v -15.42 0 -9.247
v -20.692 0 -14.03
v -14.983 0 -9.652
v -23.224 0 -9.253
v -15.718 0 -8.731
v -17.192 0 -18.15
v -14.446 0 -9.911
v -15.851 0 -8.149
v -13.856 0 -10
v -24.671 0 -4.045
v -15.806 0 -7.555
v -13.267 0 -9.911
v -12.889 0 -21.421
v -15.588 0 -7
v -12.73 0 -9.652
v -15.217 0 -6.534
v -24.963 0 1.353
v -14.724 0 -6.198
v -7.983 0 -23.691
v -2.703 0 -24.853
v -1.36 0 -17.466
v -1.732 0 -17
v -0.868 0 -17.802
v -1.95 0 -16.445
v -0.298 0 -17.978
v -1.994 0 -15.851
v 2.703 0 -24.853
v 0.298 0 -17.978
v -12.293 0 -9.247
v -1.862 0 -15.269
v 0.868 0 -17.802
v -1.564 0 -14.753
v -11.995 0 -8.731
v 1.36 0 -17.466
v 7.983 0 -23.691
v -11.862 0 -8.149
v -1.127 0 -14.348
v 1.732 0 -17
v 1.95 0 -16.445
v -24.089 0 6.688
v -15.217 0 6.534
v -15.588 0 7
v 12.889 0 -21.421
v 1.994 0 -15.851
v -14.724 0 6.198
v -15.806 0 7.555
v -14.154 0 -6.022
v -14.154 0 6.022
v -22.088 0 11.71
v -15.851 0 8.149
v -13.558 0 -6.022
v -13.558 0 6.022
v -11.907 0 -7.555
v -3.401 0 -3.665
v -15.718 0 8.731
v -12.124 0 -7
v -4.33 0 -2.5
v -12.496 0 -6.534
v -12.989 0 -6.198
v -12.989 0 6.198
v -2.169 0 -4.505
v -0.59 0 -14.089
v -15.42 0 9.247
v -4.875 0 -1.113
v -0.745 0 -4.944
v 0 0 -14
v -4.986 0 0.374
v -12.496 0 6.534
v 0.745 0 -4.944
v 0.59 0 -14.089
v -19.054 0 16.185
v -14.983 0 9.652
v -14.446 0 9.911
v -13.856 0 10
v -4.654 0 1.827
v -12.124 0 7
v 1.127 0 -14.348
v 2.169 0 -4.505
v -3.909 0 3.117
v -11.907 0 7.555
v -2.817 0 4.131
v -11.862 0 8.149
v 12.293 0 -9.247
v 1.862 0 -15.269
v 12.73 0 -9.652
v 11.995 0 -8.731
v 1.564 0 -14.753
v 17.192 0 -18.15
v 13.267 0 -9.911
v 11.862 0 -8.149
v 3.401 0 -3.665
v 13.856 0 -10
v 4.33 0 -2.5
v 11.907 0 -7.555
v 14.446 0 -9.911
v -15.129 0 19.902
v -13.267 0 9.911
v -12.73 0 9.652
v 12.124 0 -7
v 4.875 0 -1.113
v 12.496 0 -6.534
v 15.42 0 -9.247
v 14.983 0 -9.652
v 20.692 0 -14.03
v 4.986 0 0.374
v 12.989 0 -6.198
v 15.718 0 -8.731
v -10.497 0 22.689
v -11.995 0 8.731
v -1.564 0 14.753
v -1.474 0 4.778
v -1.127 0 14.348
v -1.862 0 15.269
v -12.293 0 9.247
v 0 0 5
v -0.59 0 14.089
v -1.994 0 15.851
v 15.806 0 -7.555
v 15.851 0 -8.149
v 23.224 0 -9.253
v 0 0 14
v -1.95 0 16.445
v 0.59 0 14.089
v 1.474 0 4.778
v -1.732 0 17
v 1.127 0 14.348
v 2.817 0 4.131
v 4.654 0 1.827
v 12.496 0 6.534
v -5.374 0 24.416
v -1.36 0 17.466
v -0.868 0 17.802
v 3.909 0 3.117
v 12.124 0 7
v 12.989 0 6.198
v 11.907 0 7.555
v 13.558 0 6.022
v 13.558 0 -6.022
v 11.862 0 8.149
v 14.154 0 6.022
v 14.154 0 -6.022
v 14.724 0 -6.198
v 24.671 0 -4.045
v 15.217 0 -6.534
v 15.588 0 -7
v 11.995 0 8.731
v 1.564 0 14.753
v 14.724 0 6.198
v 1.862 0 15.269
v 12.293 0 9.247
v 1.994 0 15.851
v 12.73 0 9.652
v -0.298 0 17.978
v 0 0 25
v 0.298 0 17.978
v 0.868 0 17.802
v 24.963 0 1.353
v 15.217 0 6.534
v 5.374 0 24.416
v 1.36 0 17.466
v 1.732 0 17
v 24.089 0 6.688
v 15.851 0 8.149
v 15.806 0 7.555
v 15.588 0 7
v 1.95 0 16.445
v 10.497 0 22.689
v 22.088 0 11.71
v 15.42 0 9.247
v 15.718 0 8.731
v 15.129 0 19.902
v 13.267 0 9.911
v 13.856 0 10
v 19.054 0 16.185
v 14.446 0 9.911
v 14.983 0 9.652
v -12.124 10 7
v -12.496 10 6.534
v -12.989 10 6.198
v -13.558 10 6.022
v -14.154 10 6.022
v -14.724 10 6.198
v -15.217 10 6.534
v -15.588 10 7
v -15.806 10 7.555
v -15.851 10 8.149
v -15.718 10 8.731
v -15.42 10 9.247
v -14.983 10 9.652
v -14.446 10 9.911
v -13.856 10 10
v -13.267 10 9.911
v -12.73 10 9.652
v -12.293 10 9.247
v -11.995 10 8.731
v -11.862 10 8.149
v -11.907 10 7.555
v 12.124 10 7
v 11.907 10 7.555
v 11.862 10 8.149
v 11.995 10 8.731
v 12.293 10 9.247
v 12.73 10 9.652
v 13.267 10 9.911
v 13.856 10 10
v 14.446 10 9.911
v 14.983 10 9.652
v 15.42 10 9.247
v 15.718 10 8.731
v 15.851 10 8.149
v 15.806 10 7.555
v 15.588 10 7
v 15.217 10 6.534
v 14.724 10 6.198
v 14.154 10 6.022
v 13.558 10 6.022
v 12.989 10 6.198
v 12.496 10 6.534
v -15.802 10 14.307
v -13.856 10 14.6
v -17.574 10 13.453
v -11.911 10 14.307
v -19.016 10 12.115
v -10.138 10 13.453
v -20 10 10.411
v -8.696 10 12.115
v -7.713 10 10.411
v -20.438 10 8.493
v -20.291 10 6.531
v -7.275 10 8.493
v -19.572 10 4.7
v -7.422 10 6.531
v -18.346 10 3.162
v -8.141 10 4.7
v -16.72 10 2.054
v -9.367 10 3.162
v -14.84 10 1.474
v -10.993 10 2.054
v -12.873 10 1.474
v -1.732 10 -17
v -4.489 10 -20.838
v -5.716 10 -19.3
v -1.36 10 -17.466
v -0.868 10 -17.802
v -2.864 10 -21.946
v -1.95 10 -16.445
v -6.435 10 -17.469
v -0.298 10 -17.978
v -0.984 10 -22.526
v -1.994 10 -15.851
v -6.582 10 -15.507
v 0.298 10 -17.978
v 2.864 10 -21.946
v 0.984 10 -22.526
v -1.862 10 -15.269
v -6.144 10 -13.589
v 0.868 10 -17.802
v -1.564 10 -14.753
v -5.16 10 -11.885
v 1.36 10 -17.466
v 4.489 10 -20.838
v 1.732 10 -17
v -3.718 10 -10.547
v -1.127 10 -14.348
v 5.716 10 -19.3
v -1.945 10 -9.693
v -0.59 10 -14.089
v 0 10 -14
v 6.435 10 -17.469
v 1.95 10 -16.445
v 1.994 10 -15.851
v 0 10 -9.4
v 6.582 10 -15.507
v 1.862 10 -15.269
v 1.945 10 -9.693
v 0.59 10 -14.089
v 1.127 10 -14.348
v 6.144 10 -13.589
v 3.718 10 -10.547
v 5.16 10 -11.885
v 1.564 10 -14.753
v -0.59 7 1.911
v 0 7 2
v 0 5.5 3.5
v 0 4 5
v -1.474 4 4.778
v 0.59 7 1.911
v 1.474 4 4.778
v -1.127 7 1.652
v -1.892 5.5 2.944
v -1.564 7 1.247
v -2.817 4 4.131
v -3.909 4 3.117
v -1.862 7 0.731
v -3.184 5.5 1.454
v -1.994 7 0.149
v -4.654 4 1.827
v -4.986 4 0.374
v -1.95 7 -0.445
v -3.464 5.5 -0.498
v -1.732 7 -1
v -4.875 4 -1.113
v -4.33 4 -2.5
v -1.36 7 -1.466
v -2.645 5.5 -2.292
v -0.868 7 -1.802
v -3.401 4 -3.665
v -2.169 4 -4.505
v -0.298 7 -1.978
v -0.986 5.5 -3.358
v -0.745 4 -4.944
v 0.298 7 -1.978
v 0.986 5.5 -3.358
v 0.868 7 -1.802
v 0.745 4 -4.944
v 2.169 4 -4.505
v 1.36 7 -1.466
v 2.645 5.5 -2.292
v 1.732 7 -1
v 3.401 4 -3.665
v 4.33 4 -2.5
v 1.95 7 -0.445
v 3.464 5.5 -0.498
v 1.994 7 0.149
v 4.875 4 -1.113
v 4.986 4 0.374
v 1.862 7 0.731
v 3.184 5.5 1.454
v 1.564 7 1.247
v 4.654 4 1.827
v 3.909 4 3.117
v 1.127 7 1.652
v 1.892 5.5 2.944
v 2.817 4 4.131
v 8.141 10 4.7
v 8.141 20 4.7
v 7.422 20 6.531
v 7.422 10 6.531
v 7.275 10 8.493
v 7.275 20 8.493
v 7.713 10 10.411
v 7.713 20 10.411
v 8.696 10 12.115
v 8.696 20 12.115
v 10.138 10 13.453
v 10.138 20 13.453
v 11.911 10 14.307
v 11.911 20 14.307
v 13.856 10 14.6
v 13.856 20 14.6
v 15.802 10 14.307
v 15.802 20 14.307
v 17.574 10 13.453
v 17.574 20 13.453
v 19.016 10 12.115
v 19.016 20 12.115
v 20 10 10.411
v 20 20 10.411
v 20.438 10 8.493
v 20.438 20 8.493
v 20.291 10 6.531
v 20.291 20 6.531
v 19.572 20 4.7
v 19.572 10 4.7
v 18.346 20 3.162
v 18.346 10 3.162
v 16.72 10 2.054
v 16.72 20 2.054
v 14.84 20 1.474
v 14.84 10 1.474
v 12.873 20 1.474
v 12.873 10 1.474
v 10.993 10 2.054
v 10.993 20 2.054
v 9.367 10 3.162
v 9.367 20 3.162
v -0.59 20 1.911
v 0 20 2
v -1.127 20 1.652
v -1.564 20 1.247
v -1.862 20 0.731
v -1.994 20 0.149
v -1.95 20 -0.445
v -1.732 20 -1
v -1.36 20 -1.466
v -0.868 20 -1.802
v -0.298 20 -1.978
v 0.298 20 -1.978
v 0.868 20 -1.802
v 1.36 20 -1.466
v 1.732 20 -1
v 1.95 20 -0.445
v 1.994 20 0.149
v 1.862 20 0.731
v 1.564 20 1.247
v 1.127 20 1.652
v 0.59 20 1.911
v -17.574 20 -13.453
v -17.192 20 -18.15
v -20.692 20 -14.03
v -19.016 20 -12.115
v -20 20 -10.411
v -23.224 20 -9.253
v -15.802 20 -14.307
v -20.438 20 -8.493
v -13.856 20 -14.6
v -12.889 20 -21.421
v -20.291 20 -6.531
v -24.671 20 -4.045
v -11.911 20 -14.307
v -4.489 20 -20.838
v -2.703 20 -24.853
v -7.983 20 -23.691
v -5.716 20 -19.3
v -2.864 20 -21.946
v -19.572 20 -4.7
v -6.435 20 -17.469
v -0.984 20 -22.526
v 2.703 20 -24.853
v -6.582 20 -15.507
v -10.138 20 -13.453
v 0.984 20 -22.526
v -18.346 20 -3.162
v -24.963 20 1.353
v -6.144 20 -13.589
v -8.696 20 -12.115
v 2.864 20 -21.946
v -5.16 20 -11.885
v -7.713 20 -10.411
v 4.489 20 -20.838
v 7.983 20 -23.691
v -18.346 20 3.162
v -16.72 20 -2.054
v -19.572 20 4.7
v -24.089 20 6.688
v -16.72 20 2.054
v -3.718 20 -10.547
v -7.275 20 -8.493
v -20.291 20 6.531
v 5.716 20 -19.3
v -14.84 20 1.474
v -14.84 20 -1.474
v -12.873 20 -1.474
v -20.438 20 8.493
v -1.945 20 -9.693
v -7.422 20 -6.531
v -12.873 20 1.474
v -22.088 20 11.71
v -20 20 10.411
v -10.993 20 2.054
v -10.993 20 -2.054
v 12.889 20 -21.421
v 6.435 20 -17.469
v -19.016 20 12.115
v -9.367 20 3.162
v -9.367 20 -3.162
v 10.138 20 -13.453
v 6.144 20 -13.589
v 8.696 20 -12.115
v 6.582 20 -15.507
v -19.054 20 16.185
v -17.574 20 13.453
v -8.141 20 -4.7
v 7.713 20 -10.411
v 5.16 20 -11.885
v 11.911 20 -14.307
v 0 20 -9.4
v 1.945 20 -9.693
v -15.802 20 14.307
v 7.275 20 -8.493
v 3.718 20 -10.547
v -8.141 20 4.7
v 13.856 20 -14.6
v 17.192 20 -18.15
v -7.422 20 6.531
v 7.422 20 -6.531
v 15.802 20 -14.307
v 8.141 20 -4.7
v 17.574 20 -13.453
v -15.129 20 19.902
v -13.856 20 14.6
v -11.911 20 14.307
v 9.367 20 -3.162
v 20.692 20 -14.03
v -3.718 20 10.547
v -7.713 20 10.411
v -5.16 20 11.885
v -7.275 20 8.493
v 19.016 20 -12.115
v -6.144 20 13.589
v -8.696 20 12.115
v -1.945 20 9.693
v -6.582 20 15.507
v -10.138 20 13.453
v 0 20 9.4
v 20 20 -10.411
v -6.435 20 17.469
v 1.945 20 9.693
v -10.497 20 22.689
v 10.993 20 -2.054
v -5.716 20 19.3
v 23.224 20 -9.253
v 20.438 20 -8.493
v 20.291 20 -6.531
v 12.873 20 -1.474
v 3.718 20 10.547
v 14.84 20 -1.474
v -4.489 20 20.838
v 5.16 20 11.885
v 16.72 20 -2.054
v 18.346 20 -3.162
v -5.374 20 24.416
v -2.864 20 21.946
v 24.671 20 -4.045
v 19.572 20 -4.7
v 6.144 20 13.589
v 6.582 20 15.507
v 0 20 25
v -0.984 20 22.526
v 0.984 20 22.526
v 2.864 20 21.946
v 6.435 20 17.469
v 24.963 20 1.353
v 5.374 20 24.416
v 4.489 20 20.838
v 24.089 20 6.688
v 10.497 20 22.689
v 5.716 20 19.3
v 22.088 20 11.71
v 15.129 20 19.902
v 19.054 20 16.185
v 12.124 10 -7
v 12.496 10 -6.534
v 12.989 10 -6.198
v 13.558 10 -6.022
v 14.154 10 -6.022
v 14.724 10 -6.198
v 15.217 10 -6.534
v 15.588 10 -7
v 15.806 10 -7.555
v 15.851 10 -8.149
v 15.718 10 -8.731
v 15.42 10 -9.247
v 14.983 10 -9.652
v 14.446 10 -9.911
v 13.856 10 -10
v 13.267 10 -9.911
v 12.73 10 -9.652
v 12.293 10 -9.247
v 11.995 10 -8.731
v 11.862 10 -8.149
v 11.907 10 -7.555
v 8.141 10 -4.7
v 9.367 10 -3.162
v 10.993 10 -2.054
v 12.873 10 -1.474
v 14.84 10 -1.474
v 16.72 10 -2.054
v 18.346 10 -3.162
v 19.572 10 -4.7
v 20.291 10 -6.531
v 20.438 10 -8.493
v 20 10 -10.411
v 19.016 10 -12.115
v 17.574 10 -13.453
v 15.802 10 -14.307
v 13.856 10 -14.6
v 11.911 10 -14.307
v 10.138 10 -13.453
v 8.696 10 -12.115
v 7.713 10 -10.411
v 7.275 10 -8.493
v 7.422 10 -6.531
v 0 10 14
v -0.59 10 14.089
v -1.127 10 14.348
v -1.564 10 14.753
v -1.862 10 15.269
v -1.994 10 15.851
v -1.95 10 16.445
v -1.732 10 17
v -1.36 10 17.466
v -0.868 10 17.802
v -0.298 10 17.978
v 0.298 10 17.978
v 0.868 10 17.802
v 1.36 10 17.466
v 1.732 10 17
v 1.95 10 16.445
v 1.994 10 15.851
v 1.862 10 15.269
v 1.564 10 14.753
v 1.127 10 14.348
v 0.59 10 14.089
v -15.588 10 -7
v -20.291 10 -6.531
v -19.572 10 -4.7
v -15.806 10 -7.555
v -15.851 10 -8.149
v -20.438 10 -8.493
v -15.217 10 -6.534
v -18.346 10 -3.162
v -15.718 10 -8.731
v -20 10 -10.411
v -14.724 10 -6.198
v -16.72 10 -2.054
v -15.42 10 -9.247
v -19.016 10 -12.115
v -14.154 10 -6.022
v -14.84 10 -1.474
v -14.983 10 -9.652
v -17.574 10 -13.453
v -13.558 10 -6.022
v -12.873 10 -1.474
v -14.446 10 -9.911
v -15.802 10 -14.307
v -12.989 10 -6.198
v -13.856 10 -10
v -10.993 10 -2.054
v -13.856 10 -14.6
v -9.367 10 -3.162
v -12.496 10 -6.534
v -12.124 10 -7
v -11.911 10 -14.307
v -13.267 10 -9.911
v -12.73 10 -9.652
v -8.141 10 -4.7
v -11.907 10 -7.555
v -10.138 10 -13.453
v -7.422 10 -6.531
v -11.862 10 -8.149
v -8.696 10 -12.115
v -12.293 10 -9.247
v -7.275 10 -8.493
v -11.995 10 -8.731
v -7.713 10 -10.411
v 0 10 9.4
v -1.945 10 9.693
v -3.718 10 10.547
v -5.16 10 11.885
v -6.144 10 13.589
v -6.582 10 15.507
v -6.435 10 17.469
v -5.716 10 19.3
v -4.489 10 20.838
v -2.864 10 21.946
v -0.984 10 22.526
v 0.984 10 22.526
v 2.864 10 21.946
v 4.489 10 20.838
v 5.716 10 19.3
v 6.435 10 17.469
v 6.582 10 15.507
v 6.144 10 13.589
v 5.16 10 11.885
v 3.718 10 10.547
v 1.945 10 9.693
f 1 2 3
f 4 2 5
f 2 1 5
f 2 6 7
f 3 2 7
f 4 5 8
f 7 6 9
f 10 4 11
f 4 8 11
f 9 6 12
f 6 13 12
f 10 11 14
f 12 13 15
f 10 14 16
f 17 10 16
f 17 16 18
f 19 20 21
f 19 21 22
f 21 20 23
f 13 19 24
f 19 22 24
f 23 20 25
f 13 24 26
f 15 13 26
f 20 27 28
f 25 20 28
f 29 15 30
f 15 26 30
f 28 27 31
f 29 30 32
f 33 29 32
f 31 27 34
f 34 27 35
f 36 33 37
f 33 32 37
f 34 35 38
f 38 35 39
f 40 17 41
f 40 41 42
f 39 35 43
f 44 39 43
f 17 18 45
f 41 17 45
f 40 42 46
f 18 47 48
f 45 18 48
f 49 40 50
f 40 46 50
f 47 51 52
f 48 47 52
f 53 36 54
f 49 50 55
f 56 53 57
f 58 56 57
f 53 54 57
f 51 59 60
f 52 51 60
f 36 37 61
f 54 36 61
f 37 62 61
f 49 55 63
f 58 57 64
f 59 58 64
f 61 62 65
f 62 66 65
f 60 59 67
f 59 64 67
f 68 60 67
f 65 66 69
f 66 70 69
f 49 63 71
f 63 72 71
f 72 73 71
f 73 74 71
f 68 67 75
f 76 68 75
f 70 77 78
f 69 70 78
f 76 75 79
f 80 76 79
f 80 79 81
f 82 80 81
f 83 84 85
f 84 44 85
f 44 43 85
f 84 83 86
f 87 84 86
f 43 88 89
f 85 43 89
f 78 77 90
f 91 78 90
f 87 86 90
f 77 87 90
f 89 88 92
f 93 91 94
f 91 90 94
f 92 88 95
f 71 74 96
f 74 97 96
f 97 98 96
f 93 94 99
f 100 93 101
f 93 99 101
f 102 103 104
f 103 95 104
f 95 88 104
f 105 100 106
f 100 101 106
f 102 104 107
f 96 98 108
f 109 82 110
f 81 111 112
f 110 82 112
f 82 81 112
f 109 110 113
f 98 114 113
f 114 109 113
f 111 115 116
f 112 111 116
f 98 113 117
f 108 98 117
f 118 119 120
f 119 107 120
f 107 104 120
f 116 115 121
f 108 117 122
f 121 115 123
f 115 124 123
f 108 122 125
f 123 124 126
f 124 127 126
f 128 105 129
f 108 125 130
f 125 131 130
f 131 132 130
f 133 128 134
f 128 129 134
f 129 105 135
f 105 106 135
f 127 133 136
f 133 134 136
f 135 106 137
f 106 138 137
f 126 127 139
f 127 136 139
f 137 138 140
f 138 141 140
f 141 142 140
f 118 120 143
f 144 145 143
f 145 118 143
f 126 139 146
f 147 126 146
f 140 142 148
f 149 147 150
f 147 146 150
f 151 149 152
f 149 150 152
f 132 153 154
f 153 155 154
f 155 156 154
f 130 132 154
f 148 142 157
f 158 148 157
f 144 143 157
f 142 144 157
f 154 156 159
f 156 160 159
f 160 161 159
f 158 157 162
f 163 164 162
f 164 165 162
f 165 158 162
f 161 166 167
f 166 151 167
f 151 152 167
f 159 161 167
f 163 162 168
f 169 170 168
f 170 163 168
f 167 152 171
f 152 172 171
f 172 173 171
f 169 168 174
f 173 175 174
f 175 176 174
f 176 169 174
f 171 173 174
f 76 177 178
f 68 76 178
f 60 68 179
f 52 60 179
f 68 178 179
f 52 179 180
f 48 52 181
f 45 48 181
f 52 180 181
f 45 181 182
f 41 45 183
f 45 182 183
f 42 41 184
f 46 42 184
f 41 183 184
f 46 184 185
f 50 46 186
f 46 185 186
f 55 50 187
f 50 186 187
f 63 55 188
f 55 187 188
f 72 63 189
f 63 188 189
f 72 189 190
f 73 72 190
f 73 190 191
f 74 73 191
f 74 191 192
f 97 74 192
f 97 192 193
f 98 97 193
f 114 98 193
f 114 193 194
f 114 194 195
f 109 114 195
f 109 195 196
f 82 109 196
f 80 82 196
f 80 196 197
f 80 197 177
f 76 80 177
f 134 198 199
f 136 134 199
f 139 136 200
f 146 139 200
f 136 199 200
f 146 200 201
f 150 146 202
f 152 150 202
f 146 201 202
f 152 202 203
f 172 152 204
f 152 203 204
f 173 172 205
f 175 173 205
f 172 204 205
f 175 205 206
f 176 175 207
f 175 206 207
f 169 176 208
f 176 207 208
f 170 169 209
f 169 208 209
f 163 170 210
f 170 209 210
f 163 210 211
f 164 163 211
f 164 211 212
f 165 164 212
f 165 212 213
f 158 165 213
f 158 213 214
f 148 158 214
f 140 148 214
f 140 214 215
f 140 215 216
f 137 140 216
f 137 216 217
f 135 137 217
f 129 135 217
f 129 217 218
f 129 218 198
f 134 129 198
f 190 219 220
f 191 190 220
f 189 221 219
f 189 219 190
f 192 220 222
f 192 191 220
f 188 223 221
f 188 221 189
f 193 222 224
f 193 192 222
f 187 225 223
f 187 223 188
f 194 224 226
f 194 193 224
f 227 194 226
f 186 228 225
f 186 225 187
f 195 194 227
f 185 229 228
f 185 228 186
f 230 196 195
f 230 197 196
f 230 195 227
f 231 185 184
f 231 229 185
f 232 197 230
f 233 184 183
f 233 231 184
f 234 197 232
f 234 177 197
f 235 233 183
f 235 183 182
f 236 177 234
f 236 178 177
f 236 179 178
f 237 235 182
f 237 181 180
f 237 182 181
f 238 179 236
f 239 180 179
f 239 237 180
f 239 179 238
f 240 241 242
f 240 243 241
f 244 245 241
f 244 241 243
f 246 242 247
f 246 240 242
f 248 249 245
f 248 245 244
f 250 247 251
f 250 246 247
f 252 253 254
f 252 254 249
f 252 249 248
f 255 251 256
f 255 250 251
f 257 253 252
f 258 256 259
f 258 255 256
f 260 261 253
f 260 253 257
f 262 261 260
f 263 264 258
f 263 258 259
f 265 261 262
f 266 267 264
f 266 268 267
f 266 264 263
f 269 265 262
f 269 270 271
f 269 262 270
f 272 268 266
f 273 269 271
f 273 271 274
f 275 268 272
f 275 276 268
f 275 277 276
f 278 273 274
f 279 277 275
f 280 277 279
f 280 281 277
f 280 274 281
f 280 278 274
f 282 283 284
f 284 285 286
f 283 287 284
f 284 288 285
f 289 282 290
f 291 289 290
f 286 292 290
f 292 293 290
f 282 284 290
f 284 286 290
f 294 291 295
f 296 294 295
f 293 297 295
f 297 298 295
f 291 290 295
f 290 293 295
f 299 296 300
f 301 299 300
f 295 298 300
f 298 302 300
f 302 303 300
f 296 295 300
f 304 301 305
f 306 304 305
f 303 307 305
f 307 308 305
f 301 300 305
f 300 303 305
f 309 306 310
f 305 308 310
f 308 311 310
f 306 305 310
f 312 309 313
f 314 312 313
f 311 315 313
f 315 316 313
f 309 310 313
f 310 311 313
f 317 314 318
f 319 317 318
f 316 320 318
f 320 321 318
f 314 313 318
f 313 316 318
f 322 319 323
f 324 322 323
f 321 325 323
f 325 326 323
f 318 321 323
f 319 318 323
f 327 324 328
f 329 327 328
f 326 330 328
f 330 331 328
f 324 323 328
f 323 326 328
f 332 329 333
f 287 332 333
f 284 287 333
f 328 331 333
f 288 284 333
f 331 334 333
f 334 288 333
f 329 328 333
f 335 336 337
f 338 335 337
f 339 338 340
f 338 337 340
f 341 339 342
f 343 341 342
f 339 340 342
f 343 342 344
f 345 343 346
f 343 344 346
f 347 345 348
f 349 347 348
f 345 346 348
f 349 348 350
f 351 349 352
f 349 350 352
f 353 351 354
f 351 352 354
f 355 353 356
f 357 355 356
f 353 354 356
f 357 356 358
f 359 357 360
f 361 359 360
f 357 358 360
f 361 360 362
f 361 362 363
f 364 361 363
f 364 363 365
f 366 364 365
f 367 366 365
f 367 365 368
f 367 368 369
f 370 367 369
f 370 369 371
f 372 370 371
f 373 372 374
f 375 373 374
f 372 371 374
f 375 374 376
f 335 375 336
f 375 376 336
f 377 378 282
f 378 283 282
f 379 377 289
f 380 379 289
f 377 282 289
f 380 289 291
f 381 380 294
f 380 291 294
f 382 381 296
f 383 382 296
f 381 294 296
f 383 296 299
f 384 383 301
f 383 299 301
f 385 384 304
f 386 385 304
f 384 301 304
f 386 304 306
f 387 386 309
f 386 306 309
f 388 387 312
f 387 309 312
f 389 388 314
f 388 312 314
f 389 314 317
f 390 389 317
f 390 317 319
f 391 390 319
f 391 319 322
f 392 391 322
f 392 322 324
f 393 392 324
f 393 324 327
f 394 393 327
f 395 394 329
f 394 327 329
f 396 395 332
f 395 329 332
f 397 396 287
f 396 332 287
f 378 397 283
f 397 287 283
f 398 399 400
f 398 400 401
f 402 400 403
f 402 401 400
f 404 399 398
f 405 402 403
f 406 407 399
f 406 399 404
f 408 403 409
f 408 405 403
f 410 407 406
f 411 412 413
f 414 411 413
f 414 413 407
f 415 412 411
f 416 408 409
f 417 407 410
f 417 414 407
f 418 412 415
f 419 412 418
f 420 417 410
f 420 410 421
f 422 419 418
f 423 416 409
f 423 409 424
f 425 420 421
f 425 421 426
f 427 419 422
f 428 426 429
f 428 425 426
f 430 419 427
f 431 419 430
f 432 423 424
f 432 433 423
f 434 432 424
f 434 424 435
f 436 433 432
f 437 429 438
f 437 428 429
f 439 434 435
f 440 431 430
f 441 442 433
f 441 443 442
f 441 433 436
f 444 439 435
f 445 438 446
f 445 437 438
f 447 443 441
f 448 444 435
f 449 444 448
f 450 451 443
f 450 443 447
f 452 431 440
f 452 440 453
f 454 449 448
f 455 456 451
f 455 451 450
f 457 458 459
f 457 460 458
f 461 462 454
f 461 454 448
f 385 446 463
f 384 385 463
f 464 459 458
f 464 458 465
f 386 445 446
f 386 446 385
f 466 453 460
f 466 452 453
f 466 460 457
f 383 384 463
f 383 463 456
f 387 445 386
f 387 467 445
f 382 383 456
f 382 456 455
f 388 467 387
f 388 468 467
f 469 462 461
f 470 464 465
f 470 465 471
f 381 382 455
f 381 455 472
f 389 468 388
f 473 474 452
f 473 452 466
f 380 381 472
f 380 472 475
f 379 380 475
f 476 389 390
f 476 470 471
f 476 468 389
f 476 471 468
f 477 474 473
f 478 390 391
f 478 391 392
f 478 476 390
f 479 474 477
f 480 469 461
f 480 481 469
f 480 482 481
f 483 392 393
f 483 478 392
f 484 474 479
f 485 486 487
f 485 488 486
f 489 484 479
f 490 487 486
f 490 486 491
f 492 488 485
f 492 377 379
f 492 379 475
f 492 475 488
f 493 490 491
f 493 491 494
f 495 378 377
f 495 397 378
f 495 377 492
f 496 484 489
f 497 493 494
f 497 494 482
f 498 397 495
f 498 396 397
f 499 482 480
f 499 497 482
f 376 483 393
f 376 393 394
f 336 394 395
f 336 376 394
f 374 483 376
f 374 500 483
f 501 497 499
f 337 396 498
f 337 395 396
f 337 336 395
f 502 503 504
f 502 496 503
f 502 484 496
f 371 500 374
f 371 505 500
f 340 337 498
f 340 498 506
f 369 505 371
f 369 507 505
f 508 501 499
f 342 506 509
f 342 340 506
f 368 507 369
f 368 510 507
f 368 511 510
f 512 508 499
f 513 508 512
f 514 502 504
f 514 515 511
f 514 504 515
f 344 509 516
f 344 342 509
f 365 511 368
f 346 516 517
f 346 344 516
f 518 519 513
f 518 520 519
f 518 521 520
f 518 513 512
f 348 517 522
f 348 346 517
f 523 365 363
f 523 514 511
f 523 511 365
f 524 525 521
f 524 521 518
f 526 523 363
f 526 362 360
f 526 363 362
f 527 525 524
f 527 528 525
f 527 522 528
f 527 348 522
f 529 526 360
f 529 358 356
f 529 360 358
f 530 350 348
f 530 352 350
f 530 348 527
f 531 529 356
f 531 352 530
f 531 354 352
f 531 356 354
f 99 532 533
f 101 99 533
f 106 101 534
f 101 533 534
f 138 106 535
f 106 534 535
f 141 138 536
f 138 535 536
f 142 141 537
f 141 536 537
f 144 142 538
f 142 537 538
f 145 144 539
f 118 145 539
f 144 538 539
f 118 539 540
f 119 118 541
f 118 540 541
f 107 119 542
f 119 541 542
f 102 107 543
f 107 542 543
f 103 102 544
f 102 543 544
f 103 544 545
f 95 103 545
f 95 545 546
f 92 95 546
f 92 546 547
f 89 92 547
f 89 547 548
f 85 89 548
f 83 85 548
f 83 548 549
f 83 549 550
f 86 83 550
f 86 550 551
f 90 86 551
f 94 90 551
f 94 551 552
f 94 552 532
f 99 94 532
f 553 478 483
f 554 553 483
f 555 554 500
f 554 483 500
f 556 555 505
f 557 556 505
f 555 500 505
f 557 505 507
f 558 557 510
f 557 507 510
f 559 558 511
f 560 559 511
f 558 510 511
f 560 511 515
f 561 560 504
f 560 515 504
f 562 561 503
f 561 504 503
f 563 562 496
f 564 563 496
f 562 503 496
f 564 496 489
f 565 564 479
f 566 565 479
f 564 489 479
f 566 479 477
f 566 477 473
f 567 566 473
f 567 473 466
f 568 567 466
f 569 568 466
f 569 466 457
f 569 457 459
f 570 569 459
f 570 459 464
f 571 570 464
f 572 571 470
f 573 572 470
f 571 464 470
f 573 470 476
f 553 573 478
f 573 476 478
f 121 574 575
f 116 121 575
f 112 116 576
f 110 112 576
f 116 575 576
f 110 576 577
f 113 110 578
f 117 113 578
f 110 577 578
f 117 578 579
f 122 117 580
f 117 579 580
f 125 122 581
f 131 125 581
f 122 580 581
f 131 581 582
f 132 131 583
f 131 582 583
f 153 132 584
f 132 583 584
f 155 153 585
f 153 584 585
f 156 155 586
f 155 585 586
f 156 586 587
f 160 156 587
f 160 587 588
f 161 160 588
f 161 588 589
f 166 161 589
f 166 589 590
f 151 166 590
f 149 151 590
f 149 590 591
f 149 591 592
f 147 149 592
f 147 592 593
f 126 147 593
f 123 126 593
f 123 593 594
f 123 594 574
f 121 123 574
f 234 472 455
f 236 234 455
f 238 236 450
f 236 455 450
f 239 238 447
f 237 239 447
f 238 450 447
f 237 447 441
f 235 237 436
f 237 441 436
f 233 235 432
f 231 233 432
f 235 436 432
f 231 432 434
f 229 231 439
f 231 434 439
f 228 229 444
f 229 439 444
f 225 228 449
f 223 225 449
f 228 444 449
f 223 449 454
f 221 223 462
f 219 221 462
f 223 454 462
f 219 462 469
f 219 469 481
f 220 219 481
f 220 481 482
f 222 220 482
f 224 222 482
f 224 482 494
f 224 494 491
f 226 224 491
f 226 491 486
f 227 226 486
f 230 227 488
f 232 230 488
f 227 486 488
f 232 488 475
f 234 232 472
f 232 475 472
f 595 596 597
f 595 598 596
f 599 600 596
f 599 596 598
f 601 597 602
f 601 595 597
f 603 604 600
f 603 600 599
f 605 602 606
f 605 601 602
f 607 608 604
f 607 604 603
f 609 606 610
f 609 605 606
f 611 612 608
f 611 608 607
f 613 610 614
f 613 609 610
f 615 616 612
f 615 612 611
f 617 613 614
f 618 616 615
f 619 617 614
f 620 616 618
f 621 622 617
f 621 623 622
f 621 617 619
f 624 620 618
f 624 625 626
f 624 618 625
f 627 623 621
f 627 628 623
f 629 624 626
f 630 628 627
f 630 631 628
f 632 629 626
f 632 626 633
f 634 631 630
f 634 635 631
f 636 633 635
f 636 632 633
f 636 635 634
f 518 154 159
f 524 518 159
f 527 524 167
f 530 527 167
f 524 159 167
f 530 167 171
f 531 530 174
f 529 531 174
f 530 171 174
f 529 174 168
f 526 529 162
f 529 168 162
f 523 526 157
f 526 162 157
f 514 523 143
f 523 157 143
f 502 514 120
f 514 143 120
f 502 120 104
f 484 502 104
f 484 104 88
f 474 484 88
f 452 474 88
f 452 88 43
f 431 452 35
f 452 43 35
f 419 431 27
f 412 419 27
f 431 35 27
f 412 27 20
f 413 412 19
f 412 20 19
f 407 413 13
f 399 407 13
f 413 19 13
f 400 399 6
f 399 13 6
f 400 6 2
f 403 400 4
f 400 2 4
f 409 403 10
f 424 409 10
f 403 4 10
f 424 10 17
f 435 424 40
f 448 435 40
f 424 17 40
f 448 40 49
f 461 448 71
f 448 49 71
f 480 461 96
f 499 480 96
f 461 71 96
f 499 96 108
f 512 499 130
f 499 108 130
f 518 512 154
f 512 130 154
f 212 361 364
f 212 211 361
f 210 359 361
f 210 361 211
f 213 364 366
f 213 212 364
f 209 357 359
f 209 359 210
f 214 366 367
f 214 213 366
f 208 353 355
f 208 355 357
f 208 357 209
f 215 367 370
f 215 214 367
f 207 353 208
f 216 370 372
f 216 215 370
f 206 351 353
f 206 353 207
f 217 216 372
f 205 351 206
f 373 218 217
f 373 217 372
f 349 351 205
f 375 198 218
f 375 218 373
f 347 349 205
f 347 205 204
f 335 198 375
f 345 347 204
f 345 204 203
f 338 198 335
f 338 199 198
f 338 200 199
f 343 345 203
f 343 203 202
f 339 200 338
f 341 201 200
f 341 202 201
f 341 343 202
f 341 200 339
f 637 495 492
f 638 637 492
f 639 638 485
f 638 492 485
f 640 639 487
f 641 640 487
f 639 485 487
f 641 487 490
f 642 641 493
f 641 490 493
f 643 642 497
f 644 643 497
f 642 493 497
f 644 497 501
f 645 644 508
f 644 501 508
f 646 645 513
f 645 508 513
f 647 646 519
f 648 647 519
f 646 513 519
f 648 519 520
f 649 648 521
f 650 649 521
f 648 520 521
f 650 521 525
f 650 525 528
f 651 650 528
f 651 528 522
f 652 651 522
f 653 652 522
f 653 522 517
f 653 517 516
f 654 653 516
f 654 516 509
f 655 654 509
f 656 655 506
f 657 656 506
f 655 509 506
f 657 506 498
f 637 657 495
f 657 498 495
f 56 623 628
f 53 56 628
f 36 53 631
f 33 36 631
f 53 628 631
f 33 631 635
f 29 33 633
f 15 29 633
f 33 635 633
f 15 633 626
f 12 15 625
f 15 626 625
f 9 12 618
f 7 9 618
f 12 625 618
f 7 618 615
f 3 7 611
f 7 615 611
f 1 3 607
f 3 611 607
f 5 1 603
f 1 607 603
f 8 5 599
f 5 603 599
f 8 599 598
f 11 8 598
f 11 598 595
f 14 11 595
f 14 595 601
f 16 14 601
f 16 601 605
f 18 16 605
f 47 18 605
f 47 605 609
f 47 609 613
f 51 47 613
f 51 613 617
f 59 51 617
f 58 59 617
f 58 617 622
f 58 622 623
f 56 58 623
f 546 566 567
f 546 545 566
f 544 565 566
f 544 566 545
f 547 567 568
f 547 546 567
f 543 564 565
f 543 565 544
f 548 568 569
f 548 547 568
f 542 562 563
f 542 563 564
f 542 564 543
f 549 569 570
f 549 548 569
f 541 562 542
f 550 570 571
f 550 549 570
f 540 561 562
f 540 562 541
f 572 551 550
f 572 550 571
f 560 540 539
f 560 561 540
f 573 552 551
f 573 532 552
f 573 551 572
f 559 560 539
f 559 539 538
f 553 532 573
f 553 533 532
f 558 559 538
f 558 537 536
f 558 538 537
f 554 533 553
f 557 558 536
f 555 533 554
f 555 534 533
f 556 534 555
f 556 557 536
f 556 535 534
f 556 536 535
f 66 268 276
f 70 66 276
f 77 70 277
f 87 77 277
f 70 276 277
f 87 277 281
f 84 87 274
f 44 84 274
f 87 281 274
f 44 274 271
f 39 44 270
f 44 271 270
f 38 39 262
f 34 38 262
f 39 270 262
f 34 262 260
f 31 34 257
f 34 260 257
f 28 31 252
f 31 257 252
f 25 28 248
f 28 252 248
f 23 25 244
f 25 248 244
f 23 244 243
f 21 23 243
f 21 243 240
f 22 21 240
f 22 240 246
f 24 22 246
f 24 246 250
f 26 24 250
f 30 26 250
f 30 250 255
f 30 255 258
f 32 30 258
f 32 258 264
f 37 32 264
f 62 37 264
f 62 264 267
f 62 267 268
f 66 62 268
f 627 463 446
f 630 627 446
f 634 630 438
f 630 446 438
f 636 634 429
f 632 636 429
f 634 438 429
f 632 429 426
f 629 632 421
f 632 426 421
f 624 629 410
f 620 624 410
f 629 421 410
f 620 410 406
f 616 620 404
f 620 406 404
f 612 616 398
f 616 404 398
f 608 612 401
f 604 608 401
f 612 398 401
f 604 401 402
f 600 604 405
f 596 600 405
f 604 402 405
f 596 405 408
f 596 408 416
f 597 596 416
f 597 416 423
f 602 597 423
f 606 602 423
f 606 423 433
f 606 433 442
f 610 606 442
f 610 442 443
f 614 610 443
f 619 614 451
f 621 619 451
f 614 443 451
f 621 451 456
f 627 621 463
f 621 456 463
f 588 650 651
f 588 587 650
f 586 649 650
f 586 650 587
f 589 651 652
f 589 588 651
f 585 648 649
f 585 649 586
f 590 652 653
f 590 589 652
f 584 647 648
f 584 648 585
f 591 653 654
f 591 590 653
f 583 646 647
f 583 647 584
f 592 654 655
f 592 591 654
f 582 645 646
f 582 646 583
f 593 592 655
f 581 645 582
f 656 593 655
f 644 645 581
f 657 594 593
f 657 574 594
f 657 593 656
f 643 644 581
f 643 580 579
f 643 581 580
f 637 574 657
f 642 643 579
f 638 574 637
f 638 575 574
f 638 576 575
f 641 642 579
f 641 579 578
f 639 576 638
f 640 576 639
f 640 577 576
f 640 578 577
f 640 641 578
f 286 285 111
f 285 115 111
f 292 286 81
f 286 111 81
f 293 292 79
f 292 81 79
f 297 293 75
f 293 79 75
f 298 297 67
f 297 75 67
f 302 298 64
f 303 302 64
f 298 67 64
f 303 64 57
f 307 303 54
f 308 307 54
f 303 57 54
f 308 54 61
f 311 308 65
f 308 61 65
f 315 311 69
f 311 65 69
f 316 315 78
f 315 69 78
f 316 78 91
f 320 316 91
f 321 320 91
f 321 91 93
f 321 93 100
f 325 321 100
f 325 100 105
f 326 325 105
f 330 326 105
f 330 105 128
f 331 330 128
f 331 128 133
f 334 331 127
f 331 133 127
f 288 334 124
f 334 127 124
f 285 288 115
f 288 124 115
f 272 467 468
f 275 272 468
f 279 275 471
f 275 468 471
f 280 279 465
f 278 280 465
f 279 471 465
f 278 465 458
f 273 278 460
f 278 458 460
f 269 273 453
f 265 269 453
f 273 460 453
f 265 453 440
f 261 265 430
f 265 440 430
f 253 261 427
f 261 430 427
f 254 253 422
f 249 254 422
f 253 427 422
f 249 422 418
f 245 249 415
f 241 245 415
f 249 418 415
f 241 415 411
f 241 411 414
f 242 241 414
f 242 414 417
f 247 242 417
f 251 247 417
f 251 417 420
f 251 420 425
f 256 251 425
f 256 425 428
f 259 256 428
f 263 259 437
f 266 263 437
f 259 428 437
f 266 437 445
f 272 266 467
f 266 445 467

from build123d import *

# Parameters (mm, degrees)
SKETCH1_R           = 25
BOSS_EXTRUDE1_DEPTH = 20
SKETCH2_R           = 6.6
CUT_EXTRUDE1_DEPTH  = 10
SKETCH3_R           = 2
CUT_EXTRUDE2_DEPTH  = 35
CIRPATTERN1_COUNT   = 6


with BuildPart() as part:
    # Sketch1 → Boss-Extrude1 (new body)
    with BuildSketch(Plane(origin=(0, 0, 0), x_dir=(1, 0, 0), z_dir=(0, 1, 0))):
        with Locations(Location((0, 0, 0), (0, 0, 270))):
            Circle(SKETCH1_R)
    extrude(amount=BOSS_EXTRUDE1_DEPTH)

    # Sketch2 → Cut-Extrude1 (cut)
    with BuildSketch(Plane(origin=(0, 20, 0), x_dir=(1, 0, 0), z_dir=(0, 1, 0))):
        with Locations(Location((0, 16, 0), (0, 0, 270))):
            Circle(SKETCH2_R)
    cut_extrude1 = extrude(amount=-CUT_EXTRUDE1_DEPTH, mode=Mode.SUBTRACT)

    # Sketch3 → Cut-Extrude2 (cut)
    with BuildSketch(Plane(origin=(0, 10, 0), x_dir=(1, 0, 0), z_dir=(0, 1, 0))):
        with Locations(Location((0, 16, 0), (0, 0, 270))):
            Circle(SKETCH3_R)
    cut_extrude2 = extrude(amount=-CUT_EXTRUDE2_DEPTH, mode=Mode.SUBTRACT)

    # CirPattern1: Cut-Extrude1, Cut-Extrude2 ×6 about axis
    cirpattern1_axis = Axis((0, 0, 0), (0, 1, 0))
    add([cut_extrude1.rotate(cirpattern1_axis, i * 360 / CIRPATTERN1_COUNT) for i in range(1, CIRPATTERN1_COUNT)], mode=Mode.SUBTRACT)
    add([cut_extrude2.rotate(cirpattern1_axis, i * 360 / CIRPATTERN1_COUNT) for i in range(1, CIRPATTERN1_COUNT)], mode=Mode.SUBTRACT)

    # Sketch5 → Cut-Revolve1 (revolve, cut)
    with BuildSketch(Plane.XY, mode=Mode.PRIVATE) as cut_revolve1_sk:
        Polygon((0, 20), (-2, 20), (-2, 7), (-5, 4), (-5, 0), (0, 0), align=None)
    revolve(cut_revolve1_sk.sketch.rotate(Axis((0, 26.035493364, 0), (0, -1, 0)), 270), axis=Axis((0, 26.035493364, 0), (0, -1, 0)), mode=Mode.SUBTRACT)


solid = part.part
